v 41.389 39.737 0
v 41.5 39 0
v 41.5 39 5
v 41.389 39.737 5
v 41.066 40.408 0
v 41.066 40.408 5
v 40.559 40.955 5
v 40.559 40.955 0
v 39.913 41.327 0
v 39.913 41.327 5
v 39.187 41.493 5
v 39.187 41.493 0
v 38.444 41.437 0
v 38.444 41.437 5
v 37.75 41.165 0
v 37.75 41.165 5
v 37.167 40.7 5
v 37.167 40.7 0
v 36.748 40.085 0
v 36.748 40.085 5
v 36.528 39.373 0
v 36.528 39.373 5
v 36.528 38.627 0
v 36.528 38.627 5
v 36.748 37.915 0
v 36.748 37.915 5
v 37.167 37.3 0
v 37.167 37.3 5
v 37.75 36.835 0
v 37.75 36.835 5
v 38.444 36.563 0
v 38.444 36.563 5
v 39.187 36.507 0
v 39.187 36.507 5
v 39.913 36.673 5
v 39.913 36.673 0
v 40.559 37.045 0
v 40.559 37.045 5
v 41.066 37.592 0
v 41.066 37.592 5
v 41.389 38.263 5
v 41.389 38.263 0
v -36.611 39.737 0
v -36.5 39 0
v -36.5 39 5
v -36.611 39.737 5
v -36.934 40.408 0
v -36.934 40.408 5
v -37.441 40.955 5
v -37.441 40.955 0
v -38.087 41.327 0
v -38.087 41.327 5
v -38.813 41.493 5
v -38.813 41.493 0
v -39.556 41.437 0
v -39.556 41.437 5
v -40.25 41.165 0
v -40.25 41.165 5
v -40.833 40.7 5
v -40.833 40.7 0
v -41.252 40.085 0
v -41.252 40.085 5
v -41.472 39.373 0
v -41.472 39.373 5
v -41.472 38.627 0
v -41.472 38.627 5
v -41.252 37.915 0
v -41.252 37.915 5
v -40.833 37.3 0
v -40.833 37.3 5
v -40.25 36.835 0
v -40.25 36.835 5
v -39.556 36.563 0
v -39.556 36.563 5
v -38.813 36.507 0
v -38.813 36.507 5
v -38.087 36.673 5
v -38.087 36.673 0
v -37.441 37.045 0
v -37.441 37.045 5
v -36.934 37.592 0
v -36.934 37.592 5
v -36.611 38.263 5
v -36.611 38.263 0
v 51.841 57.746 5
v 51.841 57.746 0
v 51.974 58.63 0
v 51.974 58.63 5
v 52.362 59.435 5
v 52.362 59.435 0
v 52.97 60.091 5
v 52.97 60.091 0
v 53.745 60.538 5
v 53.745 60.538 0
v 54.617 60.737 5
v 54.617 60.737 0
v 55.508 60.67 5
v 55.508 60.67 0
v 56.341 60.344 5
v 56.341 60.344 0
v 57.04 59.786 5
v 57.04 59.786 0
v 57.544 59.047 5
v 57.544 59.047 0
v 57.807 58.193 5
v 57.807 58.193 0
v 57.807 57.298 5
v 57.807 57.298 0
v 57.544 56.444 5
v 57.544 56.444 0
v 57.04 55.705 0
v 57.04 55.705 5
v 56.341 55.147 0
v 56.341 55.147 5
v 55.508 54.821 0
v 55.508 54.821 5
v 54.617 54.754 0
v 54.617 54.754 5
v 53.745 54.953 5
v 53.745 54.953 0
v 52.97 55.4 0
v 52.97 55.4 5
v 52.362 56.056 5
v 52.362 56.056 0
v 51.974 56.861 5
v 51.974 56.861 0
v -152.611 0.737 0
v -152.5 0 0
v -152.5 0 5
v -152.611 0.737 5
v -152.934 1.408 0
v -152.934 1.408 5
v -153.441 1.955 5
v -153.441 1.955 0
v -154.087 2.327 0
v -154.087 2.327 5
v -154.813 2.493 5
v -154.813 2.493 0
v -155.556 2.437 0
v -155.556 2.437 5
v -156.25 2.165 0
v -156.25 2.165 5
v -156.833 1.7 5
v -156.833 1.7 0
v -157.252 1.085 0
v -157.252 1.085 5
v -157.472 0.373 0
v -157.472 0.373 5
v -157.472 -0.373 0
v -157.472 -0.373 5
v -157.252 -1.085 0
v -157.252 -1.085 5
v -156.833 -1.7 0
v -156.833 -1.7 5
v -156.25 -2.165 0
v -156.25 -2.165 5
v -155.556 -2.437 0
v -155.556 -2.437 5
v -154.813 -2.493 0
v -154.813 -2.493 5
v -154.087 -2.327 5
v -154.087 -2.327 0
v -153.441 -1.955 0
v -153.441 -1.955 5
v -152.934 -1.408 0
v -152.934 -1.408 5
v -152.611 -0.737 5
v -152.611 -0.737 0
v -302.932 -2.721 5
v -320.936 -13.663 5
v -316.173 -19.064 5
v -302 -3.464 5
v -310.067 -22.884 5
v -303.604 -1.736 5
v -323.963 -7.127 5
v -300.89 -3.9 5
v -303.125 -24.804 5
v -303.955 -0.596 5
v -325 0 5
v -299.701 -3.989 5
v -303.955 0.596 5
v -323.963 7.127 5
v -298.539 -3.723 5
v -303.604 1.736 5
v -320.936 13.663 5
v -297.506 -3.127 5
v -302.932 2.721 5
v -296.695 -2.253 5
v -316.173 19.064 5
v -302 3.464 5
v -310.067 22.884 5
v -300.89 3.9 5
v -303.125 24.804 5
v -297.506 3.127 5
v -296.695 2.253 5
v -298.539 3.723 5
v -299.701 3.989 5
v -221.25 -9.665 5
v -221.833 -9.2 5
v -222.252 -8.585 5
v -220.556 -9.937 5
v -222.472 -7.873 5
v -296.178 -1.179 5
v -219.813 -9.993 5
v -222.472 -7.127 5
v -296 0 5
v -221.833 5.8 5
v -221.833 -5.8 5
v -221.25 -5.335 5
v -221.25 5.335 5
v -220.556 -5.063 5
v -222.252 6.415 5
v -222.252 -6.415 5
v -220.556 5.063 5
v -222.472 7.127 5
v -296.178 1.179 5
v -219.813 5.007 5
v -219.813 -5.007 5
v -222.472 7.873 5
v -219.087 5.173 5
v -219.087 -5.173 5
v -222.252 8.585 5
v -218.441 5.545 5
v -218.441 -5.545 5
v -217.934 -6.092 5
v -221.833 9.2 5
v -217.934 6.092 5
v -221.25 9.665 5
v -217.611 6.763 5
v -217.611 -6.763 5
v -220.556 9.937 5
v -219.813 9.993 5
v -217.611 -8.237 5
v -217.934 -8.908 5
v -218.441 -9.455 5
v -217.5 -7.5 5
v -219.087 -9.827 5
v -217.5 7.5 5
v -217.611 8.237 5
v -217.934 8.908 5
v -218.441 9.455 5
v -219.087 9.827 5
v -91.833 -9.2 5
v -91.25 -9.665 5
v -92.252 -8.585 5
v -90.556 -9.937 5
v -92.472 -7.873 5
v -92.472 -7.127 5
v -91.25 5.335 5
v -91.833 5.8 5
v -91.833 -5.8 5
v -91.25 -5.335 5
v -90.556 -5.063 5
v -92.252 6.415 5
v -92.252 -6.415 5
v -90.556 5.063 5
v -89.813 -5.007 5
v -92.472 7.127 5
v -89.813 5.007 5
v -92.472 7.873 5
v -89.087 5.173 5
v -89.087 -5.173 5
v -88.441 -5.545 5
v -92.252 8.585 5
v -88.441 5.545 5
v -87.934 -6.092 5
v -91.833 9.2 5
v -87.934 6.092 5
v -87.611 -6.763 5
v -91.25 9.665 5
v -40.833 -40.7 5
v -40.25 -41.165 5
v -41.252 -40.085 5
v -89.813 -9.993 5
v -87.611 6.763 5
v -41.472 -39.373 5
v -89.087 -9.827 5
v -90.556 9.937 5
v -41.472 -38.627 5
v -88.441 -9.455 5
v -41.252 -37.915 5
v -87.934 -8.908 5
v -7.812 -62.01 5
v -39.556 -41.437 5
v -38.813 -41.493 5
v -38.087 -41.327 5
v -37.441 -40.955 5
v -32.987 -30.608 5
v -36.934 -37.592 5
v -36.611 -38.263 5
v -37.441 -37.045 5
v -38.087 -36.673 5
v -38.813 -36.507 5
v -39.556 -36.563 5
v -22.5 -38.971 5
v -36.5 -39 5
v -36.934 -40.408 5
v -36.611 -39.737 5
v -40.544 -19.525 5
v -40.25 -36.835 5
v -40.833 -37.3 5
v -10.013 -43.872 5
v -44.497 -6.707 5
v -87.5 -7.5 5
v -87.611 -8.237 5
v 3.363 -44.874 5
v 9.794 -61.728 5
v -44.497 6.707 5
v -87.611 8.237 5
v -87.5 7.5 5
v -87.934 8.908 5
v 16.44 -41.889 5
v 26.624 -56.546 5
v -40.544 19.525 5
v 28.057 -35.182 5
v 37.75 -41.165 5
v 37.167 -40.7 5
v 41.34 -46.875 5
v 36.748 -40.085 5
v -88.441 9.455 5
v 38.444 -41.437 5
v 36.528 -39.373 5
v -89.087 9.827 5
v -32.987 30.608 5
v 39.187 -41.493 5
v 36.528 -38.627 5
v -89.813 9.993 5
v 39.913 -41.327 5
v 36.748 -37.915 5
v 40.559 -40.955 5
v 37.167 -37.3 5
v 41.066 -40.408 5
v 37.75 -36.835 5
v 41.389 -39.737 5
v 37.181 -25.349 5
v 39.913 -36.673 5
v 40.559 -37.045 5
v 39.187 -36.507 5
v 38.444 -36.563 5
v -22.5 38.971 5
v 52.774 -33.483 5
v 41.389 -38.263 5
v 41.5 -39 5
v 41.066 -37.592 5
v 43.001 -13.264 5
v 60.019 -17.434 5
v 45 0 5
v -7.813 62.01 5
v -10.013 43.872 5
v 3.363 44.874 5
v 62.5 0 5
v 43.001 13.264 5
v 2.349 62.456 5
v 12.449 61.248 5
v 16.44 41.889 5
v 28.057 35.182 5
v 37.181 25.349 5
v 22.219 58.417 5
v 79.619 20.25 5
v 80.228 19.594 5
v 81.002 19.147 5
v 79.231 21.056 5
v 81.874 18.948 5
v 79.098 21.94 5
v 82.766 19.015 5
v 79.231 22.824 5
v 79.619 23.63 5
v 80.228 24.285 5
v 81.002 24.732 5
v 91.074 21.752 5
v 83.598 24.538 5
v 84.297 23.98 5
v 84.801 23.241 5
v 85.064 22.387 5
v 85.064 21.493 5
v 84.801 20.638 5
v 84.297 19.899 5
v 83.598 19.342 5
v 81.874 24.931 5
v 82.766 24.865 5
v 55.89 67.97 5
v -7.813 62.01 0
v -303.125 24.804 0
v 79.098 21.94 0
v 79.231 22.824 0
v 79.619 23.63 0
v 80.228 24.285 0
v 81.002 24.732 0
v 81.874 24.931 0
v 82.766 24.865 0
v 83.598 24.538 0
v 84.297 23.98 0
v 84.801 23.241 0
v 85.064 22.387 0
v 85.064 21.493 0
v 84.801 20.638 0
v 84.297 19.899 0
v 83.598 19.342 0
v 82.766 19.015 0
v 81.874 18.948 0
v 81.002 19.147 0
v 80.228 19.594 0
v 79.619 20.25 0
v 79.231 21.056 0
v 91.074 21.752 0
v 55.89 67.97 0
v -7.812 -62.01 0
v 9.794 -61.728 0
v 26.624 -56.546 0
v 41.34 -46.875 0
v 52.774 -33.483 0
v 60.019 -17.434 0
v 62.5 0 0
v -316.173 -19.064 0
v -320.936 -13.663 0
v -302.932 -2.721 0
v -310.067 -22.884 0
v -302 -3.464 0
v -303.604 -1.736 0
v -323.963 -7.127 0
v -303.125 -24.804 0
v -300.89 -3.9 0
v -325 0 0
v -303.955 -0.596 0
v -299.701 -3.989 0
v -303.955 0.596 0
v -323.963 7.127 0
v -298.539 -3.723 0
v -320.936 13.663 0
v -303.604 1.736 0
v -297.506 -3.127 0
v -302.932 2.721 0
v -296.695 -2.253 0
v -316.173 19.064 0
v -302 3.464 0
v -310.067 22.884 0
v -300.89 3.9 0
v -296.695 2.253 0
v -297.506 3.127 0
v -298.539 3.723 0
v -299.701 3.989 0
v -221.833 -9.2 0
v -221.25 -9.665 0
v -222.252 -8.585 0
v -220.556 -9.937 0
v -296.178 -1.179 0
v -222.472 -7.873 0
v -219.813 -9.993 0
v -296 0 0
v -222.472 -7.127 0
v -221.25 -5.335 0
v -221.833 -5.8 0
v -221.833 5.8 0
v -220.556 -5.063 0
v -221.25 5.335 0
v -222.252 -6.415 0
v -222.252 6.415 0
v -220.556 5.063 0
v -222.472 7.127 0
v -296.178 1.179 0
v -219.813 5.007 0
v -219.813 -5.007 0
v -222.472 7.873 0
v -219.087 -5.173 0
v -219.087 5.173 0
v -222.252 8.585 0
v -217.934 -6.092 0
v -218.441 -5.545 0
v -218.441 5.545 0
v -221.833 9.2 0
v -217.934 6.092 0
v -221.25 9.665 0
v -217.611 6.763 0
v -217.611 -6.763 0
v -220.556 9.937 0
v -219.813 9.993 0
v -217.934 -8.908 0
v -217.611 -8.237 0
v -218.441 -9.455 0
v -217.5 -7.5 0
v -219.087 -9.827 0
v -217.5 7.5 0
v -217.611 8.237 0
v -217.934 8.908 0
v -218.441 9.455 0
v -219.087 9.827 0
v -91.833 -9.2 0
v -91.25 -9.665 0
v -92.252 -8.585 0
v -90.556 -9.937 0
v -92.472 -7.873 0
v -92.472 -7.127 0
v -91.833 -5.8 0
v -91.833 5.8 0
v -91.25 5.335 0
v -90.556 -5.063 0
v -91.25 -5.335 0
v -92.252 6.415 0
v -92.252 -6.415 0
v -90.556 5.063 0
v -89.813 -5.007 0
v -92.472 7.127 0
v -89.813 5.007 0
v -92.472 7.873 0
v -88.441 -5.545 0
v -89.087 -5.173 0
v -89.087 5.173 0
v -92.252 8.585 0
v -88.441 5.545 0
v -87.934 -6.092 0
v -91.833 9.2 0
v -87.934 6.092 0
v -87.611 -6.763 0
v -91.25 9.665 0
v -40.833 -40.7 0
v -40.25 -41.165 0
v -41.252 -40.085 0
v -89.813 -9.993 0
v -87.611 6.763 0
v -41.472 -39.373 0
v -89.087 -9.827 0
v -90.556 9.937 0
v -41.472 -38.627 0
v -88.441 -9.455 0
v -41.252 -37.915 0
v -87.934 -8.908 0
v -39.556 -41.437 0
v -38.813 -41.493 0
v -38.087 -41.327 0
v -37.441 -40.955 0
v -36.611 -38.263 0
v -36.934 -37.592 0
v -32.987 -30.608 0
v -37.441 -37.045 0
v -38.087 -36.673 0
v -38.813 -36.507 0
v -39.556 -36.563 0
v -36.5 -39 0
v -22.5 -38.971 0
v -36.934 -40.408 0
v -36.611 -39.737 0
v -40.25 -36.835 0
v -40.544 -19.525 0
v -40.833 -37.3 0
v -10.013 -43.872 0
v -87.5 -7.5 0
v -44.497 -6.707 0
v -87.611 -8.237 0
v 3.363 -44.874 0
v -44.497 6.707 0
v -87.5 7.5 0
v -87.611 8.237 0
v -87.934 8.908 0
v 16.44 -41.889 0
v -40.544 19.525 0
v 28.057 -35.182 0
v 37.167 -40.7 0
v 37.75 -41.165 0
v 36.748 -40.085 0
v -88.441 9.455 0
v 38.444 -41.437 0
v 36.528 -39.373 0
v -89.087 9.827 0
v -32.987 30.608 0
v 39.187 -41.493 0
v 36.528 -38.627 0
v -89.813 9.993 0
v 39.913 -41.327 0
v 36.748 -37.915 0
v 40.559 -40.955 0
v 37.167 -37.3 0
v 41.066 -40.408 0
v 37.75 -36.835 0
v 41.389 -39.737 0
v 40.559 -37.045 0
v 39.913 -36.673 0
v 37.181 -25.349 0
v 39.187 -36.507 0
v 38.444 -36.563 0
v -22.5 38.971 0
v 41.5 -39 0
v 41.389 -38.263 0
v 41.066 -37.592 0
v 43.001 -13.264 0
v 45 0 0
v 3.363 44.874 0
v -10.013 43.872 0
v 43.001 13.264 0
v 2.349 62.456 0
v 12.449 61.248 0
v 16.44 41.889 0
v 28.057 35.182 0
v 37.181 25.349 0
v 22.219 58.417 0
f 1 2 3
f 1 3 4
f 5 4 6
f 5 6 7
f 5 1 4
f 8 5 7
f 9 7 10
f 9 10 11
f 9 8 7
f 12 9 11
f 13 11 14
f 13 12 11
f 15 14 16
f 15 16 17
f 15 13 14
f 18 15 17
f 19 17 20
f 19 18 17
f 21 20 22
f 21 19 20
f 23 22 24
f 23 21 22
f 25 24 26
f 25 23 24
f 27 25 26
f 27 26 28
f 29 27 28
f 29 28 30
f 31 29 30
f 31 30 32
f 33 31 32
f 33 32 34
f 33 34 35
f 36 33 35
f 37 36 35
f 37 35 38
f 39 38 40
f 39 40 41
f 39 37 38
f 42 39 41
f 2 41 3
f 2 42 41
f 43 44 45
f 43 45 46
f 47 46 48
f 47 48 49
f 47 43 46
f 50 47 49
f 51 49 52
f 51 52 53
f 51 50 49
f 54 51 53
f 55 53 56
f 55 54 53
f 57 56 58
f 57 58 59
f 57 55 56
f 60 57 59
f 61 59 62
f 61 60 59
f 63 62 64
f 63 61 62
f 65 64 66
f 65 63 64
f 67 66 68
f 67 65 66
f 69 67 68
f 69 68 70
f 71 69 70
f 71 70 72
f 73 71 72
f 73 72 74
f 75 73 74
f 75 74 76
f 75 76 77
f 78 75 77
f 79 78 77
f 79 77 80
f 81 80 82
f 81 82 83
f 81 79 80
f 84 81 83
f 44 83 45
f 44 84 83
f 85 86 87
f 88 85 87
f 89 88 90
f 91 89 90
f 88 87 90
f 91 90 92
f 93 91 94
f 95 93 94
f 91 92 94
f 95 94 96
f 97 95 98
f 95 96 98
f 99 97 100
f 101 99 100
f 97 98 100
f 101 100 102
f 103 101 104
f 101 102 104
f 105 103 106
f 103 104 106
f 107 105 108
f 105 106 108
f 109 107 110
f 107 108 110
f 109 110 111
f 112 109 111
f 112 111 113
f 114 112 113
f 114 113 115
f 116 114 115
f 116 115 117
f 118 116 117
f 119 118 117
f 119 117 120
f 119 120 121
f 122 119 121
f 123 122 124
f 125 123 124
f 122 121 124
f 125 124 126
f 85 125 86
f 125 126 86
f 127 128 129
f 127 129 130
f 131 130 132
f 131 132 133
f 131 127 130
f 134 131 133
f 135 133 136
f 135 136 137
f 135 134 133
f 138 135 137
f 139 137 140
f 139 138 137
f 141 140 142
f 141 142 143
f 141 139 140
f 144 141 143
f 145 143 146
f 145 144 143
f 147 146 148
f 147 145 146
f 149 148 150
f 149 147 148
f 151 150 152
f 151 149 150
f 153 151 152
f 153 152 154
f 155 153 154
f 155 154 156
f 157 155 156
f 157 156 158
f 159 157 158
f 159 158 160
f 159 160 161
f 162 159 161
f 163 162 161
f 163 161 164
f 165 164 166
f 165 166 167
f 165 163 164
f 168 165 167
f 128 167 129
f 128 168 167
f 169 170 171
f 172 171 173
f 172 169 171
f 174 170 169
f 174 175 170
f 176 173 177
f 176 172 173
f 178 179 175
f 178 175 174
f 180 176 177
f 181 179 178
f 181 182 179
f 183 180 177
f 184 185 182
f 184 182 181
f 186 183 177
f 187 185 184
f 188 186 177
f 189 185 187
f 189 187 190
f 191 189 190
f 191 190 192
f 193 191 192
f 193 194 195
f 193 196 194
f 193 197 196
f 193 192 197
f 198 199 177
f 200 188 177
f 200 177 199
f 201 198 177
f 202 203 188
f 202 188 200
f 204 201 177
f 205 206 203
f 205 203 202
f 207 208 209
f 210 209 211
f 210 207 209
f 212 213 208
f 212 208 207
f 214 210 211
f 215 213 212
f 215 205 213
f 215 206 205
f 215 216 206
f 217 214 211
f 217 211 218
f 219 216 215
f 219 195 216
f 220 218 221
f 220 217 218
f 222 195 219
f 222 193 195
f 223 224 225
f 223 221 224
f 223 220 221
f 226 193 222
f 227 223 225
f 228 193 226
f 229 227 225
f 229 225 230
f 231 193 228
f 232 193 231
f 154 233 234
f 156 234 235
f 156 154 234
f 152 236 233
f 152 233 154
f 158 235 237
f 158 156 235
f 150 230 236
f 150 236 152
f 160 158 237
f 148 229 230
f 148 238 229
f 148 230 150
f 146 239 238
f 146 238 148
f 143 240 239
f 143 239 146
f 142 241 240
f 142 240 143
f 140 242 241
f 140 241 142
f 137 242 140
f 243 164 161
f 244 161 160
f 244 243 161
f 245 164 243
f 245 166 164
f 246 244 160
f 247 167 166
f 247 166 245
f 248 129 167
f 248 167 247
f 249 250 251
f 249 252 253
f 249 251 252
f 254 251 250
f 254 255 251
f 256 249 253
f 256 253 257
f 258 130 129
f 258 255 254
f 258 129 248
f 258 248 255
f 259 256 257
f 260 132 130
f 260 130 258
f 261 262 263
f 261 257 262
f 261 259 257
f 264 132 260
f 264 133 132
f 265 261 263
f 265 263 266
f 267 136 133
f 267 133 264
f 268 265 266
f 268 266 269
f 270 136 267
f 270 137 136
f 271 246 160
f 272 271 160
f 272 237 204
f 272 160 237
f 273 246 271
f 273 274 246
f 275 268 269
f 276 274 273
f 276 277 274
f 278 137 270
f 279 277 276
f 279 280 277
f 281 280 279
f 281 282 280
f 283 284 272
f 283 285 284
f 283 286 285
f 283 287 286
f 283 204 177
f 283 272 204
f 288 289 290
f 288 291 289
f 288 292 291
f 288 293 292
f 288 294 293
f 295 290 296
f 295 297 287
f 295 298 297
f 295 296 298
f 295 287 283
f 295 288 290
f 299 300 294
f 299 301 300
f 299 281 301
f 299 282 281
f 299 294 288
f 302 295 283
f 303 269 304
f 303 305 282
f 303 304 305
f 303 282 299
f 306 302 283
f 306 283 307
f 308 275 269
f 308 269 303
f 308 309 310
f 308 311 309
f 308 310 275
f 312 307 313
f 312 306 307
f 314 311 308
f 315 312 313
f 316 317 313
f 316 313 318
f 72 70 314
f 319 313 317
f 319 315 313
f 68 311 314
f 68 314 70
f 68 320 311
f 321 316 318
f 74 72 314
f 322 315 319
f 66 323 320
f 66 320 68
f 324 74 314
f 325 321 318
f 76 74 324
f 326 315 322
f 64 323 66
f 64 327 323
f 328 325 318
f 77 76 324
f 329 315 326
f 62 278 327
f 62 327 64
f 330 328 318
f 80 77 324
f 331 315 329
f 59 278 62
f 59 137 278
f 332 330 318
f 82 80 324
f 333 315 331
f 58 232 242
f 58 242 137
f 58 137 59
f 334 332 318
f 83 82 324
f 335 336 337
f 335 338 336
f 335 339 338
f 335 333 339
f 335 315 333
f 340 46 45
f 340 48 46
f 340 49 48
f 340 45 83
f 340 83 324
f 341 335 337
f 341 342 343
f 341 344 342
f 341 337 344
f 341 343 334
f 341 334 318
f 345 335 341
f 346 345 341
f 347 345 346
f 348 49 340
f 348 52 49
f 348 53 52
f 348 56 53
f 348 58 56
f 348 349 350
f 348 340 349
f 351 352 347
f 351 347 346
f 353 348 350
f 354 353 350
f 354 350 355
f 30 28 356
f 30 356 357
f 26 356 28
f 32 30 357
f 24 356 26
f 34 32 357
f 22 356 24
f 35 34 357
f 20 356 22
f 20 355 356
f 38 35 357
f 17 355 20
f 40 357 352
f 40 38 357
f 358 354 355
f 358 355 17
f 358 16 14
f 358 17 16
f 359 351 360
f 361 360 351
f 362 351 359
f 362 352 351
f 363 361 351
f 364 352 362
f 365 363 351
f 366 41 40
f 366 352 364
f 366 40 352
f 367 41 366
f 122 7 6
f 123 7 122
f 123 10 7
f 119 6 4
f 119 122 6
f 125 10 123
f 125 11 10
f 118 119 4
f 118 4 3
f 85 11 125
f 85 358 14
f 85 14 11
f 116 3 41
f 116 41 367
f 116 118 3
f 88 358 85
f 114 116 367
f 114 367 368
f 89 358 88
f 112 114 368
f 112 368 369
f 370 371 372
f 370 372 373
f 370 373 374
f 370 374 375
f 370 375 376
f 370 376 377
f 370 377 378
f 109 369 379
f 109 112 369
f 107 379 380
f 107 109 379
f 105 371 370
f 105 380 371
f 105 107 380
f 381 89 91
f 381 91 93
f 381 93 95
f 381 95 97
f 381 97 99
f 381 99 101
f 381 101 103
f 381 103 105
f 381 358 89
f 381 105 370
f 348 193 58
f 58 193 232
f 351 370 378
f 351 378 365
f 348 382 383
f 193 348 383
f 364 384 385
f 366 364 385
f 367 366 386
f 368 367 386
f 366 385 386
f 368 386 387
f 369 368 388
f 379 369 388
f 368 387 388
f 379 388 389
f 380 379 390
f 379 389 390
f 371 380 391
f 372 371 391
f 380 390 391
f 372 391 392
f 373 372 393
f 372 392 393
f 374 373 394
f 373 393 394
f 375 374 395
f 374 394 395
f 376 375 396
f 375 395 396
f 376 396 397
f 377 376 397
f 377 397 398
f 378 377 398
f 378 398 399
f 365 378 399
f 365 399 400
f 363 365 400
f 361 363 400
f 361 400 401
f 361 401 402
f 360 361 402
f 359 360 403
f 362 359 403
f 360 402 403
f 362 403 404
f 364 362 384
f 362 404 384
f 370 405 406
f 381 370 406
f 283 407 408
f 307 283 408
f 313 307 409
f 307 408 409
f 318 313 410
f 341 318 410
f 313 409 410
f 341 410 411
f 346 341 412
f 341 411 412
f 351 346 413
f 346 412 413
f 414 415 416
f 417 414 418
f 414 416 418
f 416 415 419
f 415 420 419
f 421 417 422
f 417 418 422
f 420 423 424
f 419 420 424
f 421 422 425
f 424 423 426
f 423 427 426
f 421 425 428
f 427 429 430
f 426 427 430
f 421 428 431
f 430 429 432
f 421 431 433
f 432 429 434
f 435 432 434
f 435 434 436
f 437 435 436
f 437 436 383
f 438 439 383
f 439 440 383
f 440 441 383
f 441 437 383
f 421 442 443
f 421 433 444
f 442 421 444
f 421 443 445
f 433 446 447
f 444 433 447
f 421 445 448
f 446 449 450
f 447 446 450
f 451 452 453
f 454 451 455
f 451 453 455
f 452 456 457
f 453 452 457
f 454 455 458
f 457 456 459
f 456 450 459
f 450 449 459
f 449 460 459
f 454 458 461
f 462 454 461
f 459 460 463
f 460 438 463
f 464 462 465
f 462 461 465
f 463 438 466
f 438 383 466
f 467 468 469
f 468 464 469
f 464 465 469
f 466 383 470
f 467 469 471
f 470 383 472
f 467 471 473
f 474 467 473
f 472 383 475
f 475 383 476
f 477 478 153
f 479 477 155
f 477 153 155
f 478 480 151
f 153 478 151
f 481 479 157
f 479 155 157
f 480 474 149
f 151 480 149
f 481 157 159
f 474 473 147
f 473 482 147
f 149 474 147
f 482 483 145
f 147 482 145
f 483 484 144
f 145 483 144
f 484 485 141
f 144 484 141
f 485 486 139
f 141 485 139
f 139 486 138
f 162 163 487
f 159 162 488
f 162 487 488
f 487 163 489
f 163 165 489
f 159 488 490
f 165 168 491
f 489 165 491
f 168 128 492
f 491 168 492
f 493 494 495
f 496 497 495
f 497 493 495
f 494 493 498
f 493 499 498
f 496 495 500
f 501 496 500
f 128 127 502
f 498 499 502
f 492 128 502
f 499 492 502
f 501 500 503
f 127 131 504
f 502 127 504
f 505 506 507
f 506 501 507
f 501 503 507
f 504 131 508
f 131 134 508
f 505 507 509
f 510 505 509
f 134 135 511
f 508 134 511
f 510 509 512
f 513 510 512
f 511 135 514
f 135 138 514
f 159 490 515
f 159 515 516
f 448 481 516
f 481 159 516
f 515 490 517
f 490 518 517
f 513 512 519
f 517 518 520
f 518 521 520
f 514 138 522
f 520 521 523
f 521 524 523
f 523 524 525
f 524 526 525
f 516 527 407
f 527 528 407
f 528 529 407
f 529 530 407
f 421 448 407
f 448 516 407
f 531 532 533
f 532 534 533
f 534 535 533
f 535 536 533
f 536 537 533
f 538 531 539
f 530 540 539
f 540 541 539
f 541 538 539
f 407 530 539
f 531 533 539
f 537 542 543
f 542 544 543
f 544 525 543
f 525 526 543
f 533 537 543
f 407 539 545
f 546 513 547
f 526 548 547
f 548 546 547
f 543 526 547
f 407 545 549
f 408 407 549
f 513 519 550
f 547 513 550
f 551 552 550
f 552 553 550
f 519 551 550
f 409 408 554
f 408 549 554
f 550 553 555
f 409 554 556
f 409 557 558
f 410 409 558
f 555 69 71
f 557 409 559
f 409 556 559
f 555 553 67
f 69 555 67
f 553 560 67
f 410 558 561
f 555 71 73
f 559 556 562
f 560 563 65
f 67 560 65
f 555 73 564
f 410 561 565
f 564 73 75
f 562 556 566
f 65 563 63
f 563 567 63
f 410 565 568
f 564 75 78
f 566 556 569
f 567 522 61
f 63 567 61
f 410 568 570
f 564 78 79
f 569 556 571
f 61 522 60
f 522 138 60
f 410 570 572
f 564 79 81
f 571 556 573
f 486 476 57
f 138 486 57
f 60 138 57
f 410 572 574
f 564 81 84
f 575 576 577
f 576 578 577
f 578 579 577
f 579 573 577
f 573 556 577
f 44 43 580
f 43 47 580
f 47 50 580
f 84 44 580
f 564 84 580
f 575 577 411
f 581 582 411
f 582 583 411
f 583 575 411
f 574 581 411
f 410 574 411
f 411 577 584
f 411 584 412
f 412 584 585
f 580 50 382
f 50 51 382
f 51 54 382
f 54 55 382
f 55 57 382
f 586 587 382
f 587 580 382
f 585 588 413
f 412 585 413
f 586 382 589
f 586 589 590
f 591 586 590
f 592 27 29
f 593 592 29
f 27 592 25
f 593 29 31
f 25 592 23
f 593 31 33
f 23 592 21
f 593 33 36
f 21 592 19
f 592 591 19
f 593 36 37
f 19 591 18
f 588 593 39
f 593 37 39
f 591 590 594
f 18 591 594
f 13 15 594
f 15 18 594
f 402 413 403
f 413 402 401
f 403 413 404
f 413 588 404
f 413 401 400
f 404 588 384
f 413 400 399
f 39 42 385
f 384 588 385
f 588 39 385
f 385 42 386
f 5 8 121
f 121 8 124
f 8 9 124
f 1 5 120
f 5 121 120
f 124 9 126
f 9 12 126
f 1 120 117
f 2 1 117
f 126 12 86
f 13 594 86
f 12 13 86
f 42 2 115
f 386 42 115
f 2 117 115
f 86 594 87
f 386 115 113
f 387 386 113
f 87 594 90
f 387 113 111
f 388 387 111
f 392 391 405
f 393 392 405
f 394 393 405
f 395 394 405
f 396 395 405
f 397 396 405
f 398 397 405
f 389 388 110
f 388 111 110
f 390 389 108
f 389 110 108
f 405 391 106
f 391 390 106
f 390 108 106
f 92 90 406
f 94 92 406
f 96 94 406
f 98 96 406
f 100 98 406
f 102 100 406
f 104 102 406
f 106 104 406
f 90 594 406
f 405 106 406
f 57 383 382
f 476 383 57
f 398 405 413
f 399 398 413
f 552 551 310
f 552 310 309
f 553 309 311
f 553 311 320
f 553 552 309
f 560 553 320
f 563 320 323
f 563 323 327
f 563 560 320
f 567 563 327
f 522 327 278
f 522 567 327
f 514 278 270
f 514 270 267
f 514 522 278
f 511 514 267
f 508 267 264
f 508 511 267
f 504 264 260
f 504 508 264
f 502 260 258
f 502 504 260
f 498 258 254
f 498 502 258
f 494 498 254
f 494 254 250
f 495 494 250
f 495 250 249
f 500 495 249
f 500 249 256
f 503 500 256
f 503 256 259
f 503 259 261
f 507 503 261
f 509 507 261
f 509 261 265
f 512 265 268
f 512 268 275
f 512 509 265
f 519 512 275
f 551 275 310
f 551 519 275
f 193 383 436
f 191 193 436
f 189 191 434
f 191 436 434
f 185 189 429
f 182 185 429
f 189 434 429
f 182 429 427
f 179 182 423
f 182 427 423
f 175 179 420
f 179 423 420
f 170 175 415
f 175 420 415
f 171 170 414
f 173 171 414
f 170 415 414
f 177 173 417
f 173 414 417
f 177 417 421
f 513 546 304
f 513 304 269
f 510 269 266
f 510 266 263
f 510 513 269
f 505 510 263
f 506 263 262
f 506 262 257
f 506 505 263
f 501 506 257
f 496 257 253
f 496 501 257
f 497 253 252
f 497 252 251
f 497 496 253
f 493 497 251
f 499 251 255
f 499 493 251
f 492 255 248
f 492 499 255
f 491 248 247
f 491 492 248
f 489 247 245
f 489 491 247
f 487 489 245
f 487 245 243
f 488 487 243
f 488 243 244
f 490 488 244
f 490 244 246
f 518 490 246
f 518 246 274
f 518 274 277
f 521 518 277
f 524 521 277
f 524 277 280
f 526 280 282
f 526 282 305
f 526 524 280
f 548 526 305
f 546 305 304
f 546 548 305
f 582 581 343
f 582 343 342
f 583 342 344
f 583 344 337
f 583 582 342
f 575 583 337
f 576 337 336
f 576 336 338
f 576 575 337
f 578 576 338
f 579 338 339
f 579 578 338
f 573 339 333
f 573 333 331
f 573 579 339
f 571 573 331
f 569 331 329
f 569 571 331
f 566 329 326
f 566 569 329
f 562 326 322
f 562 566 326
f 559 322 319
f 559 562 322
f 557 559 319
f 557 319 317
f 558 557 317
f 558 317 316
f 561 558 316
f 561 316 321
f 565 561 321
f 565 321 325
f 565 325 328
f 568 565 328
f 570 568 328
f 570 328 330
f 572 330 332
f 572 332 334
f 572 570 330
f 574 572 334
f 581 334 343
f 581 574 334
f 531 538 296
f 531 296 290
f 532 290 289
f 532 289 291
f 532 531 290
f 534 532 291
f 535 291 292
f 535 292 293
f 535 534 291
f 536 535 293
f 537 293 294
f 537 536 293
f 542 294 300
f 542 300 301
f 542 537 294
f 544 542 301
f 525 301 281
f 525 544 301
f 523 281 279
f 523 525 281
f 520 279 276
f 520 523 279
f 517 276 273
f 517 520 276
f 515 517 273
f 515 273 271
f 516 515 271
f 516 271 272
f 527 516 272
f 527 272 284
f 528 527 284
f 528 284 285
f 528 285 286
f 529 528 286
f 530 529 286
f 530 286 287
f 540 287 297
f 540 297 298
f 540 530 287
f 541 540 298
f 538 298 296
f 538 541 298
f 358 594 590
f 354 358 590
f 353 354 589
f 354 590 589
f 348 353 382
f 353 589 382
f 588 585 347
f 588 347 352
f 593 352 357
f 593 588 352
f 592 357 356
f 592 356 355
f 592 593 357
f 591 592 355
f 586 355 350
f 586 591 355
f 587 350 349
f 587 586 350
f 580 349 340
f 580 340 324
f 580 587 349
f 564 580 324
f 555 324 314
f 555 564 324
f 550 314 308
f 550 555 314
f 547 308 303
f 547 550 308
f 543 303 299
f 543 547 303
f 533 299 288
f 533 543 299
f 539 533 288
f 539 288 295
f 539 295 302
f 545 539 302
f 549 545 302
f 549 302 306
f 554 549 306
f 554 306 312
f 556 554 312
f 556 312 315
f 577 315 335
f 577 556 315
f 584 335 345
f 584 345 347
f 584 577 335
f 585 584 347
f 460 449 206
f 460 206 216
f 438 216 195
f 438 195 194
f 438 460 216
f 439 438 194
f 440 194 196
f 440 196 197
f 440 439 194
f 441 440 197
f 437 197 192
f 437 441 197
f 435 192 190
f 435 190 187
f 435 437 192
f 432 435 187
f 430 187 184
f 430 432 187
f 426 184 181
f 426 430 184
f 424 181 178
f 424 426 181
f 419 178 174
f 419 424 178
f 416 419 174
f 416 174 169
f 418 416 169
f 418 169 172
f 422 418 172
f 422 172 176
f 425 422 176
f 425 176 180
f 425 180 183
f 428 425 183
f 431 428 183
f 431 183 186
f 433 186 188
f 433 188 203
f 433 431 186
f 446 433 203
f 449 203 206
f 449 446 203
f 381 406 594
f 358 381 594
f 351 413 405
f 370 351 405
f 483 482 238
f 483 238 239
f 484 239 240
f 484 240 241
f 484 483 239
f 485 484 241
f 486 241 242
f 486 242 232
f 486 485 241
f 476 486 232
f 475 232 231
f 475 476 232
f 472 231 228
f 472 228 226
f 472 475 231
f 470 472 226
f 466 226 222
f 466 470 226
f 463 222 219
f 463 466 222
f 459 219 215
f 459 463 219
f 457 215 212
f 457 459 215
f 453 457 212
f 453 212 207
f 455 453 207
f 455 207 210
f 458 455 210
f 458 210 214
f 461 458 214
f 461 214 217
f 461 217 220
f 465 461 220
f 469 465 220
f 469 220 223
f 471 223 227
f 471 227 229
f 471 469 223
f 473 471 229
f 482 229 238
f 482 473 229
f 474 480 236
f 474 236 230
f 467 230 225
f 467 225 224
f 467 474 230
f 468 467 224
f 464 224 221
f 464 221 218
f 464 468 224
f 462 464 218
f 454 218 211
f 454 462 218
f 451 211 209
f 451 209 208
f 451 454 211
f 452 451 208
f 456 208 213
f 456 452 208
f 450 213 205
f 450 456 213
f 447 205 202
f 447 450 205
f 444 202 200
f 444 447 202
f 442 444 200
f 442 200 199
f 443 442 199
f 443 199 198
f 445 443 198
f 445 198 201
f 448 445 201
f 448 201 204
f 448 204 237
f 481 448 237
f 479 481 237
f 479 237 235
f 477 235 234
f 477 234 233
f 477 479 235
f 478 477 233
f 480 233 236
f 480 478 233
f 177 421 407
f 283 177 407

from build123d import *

# Parameters (mm, degrees)
SKETCH1_R           = 2.5
SKETCH1_R_2         = 45
SKETCH1_R_3         = 4
BOSS_EXTRUDE1_DEPTH = 5
SKETCH2_R           = 3
BOSS_EXTRUDE3_DEPTH = 5


with BuildPart() as part:
    # Sketch1 → Boss-Extrude1 (new body)
    with BuildSketch(Plane.XY):
        with BuildLine():
            Line((-303.125, -24.803918541), (-7.8125, -62.009796353))
            ThreePointArc((-7.8125, -62.009796353), (62.5, 0), (-7.8125, 62.009796353))
            Line((-7.8125, 62.009796353), (-303.125, 24.803918541))
            ThreePointArc((-303.125, 24.803918541), (-325, 0), (-303.125, -24.803918541))
        make_face()
        with Locations((-220, -7.5)):
            Circle(SKETCH1_R, mode=Mode.SUBTRACT)
        with Locations((-90, -7.5)):
            Circle(SKETCH1_R, mode=Mode.SUBTRACT)
        with Locations((-220, 7.5)):
            Circle(SKETCH1_R, mode=Mode.SUBTRACT)
        with Locations((-155, 0)):
            Circle(SKETCH1_R, mode=Mode.SUBTRACT)
        with Locations((-90, 7.5)):
            Circle(SKETCH1_R, mode=Mode.SUBTRACT)
        with Locations((39, 39)):
            Circle(SKETCH1_R, mode=Mode.SUBTRACT)
        with Locations((-39, -39)):
            Circle(SKETCH1_R, mode=Mode.SUBTRACT)
        with Locations((39, -39)):
            Circle(SKETCH1_R, mode=Mode.SUBTRACT)
        Circle(SKETCH1_R_2, mode=Mode.SUBTRACT)
        with Locations((-39, 39)):
            Circle(SKETCH1_R, mode=Mode.SUBTRACT)
        with Locations((-300, 0)):
            Circle(SKETCH1_R_3, mode=Mode.SUBTRACT)
    extrude(amount=BOSS_EXTRUDE1_DEPTH)

    # Sketch2 → Boss-Extrude3 (add)
    with BuildSketch(Plane(origin=(0, 0, 0), x_dir=(-1, 0, 0), z_dir=(0, 0, -1))):
        Polygon((-62.5, 0), (-91.073673697, 21.751815091), (-55.889899017, 67.970013109), (-22.218770371, 58.417259806), (-51.948744274, 34.750222566), align=None)
        with Locations((-54.840808576, 57.745505577)):
            Circle(SKETCH2_R, mode=Mode.SUBTRACT)
        with Locations((-82.098001573, 21.939843596)):
            Circle(SKETCH2_R, mode=Mode.SUBTRACT)
    extrude(amount=-BOSS_EXTRUDE3_DEPTH)


solid = part.part
